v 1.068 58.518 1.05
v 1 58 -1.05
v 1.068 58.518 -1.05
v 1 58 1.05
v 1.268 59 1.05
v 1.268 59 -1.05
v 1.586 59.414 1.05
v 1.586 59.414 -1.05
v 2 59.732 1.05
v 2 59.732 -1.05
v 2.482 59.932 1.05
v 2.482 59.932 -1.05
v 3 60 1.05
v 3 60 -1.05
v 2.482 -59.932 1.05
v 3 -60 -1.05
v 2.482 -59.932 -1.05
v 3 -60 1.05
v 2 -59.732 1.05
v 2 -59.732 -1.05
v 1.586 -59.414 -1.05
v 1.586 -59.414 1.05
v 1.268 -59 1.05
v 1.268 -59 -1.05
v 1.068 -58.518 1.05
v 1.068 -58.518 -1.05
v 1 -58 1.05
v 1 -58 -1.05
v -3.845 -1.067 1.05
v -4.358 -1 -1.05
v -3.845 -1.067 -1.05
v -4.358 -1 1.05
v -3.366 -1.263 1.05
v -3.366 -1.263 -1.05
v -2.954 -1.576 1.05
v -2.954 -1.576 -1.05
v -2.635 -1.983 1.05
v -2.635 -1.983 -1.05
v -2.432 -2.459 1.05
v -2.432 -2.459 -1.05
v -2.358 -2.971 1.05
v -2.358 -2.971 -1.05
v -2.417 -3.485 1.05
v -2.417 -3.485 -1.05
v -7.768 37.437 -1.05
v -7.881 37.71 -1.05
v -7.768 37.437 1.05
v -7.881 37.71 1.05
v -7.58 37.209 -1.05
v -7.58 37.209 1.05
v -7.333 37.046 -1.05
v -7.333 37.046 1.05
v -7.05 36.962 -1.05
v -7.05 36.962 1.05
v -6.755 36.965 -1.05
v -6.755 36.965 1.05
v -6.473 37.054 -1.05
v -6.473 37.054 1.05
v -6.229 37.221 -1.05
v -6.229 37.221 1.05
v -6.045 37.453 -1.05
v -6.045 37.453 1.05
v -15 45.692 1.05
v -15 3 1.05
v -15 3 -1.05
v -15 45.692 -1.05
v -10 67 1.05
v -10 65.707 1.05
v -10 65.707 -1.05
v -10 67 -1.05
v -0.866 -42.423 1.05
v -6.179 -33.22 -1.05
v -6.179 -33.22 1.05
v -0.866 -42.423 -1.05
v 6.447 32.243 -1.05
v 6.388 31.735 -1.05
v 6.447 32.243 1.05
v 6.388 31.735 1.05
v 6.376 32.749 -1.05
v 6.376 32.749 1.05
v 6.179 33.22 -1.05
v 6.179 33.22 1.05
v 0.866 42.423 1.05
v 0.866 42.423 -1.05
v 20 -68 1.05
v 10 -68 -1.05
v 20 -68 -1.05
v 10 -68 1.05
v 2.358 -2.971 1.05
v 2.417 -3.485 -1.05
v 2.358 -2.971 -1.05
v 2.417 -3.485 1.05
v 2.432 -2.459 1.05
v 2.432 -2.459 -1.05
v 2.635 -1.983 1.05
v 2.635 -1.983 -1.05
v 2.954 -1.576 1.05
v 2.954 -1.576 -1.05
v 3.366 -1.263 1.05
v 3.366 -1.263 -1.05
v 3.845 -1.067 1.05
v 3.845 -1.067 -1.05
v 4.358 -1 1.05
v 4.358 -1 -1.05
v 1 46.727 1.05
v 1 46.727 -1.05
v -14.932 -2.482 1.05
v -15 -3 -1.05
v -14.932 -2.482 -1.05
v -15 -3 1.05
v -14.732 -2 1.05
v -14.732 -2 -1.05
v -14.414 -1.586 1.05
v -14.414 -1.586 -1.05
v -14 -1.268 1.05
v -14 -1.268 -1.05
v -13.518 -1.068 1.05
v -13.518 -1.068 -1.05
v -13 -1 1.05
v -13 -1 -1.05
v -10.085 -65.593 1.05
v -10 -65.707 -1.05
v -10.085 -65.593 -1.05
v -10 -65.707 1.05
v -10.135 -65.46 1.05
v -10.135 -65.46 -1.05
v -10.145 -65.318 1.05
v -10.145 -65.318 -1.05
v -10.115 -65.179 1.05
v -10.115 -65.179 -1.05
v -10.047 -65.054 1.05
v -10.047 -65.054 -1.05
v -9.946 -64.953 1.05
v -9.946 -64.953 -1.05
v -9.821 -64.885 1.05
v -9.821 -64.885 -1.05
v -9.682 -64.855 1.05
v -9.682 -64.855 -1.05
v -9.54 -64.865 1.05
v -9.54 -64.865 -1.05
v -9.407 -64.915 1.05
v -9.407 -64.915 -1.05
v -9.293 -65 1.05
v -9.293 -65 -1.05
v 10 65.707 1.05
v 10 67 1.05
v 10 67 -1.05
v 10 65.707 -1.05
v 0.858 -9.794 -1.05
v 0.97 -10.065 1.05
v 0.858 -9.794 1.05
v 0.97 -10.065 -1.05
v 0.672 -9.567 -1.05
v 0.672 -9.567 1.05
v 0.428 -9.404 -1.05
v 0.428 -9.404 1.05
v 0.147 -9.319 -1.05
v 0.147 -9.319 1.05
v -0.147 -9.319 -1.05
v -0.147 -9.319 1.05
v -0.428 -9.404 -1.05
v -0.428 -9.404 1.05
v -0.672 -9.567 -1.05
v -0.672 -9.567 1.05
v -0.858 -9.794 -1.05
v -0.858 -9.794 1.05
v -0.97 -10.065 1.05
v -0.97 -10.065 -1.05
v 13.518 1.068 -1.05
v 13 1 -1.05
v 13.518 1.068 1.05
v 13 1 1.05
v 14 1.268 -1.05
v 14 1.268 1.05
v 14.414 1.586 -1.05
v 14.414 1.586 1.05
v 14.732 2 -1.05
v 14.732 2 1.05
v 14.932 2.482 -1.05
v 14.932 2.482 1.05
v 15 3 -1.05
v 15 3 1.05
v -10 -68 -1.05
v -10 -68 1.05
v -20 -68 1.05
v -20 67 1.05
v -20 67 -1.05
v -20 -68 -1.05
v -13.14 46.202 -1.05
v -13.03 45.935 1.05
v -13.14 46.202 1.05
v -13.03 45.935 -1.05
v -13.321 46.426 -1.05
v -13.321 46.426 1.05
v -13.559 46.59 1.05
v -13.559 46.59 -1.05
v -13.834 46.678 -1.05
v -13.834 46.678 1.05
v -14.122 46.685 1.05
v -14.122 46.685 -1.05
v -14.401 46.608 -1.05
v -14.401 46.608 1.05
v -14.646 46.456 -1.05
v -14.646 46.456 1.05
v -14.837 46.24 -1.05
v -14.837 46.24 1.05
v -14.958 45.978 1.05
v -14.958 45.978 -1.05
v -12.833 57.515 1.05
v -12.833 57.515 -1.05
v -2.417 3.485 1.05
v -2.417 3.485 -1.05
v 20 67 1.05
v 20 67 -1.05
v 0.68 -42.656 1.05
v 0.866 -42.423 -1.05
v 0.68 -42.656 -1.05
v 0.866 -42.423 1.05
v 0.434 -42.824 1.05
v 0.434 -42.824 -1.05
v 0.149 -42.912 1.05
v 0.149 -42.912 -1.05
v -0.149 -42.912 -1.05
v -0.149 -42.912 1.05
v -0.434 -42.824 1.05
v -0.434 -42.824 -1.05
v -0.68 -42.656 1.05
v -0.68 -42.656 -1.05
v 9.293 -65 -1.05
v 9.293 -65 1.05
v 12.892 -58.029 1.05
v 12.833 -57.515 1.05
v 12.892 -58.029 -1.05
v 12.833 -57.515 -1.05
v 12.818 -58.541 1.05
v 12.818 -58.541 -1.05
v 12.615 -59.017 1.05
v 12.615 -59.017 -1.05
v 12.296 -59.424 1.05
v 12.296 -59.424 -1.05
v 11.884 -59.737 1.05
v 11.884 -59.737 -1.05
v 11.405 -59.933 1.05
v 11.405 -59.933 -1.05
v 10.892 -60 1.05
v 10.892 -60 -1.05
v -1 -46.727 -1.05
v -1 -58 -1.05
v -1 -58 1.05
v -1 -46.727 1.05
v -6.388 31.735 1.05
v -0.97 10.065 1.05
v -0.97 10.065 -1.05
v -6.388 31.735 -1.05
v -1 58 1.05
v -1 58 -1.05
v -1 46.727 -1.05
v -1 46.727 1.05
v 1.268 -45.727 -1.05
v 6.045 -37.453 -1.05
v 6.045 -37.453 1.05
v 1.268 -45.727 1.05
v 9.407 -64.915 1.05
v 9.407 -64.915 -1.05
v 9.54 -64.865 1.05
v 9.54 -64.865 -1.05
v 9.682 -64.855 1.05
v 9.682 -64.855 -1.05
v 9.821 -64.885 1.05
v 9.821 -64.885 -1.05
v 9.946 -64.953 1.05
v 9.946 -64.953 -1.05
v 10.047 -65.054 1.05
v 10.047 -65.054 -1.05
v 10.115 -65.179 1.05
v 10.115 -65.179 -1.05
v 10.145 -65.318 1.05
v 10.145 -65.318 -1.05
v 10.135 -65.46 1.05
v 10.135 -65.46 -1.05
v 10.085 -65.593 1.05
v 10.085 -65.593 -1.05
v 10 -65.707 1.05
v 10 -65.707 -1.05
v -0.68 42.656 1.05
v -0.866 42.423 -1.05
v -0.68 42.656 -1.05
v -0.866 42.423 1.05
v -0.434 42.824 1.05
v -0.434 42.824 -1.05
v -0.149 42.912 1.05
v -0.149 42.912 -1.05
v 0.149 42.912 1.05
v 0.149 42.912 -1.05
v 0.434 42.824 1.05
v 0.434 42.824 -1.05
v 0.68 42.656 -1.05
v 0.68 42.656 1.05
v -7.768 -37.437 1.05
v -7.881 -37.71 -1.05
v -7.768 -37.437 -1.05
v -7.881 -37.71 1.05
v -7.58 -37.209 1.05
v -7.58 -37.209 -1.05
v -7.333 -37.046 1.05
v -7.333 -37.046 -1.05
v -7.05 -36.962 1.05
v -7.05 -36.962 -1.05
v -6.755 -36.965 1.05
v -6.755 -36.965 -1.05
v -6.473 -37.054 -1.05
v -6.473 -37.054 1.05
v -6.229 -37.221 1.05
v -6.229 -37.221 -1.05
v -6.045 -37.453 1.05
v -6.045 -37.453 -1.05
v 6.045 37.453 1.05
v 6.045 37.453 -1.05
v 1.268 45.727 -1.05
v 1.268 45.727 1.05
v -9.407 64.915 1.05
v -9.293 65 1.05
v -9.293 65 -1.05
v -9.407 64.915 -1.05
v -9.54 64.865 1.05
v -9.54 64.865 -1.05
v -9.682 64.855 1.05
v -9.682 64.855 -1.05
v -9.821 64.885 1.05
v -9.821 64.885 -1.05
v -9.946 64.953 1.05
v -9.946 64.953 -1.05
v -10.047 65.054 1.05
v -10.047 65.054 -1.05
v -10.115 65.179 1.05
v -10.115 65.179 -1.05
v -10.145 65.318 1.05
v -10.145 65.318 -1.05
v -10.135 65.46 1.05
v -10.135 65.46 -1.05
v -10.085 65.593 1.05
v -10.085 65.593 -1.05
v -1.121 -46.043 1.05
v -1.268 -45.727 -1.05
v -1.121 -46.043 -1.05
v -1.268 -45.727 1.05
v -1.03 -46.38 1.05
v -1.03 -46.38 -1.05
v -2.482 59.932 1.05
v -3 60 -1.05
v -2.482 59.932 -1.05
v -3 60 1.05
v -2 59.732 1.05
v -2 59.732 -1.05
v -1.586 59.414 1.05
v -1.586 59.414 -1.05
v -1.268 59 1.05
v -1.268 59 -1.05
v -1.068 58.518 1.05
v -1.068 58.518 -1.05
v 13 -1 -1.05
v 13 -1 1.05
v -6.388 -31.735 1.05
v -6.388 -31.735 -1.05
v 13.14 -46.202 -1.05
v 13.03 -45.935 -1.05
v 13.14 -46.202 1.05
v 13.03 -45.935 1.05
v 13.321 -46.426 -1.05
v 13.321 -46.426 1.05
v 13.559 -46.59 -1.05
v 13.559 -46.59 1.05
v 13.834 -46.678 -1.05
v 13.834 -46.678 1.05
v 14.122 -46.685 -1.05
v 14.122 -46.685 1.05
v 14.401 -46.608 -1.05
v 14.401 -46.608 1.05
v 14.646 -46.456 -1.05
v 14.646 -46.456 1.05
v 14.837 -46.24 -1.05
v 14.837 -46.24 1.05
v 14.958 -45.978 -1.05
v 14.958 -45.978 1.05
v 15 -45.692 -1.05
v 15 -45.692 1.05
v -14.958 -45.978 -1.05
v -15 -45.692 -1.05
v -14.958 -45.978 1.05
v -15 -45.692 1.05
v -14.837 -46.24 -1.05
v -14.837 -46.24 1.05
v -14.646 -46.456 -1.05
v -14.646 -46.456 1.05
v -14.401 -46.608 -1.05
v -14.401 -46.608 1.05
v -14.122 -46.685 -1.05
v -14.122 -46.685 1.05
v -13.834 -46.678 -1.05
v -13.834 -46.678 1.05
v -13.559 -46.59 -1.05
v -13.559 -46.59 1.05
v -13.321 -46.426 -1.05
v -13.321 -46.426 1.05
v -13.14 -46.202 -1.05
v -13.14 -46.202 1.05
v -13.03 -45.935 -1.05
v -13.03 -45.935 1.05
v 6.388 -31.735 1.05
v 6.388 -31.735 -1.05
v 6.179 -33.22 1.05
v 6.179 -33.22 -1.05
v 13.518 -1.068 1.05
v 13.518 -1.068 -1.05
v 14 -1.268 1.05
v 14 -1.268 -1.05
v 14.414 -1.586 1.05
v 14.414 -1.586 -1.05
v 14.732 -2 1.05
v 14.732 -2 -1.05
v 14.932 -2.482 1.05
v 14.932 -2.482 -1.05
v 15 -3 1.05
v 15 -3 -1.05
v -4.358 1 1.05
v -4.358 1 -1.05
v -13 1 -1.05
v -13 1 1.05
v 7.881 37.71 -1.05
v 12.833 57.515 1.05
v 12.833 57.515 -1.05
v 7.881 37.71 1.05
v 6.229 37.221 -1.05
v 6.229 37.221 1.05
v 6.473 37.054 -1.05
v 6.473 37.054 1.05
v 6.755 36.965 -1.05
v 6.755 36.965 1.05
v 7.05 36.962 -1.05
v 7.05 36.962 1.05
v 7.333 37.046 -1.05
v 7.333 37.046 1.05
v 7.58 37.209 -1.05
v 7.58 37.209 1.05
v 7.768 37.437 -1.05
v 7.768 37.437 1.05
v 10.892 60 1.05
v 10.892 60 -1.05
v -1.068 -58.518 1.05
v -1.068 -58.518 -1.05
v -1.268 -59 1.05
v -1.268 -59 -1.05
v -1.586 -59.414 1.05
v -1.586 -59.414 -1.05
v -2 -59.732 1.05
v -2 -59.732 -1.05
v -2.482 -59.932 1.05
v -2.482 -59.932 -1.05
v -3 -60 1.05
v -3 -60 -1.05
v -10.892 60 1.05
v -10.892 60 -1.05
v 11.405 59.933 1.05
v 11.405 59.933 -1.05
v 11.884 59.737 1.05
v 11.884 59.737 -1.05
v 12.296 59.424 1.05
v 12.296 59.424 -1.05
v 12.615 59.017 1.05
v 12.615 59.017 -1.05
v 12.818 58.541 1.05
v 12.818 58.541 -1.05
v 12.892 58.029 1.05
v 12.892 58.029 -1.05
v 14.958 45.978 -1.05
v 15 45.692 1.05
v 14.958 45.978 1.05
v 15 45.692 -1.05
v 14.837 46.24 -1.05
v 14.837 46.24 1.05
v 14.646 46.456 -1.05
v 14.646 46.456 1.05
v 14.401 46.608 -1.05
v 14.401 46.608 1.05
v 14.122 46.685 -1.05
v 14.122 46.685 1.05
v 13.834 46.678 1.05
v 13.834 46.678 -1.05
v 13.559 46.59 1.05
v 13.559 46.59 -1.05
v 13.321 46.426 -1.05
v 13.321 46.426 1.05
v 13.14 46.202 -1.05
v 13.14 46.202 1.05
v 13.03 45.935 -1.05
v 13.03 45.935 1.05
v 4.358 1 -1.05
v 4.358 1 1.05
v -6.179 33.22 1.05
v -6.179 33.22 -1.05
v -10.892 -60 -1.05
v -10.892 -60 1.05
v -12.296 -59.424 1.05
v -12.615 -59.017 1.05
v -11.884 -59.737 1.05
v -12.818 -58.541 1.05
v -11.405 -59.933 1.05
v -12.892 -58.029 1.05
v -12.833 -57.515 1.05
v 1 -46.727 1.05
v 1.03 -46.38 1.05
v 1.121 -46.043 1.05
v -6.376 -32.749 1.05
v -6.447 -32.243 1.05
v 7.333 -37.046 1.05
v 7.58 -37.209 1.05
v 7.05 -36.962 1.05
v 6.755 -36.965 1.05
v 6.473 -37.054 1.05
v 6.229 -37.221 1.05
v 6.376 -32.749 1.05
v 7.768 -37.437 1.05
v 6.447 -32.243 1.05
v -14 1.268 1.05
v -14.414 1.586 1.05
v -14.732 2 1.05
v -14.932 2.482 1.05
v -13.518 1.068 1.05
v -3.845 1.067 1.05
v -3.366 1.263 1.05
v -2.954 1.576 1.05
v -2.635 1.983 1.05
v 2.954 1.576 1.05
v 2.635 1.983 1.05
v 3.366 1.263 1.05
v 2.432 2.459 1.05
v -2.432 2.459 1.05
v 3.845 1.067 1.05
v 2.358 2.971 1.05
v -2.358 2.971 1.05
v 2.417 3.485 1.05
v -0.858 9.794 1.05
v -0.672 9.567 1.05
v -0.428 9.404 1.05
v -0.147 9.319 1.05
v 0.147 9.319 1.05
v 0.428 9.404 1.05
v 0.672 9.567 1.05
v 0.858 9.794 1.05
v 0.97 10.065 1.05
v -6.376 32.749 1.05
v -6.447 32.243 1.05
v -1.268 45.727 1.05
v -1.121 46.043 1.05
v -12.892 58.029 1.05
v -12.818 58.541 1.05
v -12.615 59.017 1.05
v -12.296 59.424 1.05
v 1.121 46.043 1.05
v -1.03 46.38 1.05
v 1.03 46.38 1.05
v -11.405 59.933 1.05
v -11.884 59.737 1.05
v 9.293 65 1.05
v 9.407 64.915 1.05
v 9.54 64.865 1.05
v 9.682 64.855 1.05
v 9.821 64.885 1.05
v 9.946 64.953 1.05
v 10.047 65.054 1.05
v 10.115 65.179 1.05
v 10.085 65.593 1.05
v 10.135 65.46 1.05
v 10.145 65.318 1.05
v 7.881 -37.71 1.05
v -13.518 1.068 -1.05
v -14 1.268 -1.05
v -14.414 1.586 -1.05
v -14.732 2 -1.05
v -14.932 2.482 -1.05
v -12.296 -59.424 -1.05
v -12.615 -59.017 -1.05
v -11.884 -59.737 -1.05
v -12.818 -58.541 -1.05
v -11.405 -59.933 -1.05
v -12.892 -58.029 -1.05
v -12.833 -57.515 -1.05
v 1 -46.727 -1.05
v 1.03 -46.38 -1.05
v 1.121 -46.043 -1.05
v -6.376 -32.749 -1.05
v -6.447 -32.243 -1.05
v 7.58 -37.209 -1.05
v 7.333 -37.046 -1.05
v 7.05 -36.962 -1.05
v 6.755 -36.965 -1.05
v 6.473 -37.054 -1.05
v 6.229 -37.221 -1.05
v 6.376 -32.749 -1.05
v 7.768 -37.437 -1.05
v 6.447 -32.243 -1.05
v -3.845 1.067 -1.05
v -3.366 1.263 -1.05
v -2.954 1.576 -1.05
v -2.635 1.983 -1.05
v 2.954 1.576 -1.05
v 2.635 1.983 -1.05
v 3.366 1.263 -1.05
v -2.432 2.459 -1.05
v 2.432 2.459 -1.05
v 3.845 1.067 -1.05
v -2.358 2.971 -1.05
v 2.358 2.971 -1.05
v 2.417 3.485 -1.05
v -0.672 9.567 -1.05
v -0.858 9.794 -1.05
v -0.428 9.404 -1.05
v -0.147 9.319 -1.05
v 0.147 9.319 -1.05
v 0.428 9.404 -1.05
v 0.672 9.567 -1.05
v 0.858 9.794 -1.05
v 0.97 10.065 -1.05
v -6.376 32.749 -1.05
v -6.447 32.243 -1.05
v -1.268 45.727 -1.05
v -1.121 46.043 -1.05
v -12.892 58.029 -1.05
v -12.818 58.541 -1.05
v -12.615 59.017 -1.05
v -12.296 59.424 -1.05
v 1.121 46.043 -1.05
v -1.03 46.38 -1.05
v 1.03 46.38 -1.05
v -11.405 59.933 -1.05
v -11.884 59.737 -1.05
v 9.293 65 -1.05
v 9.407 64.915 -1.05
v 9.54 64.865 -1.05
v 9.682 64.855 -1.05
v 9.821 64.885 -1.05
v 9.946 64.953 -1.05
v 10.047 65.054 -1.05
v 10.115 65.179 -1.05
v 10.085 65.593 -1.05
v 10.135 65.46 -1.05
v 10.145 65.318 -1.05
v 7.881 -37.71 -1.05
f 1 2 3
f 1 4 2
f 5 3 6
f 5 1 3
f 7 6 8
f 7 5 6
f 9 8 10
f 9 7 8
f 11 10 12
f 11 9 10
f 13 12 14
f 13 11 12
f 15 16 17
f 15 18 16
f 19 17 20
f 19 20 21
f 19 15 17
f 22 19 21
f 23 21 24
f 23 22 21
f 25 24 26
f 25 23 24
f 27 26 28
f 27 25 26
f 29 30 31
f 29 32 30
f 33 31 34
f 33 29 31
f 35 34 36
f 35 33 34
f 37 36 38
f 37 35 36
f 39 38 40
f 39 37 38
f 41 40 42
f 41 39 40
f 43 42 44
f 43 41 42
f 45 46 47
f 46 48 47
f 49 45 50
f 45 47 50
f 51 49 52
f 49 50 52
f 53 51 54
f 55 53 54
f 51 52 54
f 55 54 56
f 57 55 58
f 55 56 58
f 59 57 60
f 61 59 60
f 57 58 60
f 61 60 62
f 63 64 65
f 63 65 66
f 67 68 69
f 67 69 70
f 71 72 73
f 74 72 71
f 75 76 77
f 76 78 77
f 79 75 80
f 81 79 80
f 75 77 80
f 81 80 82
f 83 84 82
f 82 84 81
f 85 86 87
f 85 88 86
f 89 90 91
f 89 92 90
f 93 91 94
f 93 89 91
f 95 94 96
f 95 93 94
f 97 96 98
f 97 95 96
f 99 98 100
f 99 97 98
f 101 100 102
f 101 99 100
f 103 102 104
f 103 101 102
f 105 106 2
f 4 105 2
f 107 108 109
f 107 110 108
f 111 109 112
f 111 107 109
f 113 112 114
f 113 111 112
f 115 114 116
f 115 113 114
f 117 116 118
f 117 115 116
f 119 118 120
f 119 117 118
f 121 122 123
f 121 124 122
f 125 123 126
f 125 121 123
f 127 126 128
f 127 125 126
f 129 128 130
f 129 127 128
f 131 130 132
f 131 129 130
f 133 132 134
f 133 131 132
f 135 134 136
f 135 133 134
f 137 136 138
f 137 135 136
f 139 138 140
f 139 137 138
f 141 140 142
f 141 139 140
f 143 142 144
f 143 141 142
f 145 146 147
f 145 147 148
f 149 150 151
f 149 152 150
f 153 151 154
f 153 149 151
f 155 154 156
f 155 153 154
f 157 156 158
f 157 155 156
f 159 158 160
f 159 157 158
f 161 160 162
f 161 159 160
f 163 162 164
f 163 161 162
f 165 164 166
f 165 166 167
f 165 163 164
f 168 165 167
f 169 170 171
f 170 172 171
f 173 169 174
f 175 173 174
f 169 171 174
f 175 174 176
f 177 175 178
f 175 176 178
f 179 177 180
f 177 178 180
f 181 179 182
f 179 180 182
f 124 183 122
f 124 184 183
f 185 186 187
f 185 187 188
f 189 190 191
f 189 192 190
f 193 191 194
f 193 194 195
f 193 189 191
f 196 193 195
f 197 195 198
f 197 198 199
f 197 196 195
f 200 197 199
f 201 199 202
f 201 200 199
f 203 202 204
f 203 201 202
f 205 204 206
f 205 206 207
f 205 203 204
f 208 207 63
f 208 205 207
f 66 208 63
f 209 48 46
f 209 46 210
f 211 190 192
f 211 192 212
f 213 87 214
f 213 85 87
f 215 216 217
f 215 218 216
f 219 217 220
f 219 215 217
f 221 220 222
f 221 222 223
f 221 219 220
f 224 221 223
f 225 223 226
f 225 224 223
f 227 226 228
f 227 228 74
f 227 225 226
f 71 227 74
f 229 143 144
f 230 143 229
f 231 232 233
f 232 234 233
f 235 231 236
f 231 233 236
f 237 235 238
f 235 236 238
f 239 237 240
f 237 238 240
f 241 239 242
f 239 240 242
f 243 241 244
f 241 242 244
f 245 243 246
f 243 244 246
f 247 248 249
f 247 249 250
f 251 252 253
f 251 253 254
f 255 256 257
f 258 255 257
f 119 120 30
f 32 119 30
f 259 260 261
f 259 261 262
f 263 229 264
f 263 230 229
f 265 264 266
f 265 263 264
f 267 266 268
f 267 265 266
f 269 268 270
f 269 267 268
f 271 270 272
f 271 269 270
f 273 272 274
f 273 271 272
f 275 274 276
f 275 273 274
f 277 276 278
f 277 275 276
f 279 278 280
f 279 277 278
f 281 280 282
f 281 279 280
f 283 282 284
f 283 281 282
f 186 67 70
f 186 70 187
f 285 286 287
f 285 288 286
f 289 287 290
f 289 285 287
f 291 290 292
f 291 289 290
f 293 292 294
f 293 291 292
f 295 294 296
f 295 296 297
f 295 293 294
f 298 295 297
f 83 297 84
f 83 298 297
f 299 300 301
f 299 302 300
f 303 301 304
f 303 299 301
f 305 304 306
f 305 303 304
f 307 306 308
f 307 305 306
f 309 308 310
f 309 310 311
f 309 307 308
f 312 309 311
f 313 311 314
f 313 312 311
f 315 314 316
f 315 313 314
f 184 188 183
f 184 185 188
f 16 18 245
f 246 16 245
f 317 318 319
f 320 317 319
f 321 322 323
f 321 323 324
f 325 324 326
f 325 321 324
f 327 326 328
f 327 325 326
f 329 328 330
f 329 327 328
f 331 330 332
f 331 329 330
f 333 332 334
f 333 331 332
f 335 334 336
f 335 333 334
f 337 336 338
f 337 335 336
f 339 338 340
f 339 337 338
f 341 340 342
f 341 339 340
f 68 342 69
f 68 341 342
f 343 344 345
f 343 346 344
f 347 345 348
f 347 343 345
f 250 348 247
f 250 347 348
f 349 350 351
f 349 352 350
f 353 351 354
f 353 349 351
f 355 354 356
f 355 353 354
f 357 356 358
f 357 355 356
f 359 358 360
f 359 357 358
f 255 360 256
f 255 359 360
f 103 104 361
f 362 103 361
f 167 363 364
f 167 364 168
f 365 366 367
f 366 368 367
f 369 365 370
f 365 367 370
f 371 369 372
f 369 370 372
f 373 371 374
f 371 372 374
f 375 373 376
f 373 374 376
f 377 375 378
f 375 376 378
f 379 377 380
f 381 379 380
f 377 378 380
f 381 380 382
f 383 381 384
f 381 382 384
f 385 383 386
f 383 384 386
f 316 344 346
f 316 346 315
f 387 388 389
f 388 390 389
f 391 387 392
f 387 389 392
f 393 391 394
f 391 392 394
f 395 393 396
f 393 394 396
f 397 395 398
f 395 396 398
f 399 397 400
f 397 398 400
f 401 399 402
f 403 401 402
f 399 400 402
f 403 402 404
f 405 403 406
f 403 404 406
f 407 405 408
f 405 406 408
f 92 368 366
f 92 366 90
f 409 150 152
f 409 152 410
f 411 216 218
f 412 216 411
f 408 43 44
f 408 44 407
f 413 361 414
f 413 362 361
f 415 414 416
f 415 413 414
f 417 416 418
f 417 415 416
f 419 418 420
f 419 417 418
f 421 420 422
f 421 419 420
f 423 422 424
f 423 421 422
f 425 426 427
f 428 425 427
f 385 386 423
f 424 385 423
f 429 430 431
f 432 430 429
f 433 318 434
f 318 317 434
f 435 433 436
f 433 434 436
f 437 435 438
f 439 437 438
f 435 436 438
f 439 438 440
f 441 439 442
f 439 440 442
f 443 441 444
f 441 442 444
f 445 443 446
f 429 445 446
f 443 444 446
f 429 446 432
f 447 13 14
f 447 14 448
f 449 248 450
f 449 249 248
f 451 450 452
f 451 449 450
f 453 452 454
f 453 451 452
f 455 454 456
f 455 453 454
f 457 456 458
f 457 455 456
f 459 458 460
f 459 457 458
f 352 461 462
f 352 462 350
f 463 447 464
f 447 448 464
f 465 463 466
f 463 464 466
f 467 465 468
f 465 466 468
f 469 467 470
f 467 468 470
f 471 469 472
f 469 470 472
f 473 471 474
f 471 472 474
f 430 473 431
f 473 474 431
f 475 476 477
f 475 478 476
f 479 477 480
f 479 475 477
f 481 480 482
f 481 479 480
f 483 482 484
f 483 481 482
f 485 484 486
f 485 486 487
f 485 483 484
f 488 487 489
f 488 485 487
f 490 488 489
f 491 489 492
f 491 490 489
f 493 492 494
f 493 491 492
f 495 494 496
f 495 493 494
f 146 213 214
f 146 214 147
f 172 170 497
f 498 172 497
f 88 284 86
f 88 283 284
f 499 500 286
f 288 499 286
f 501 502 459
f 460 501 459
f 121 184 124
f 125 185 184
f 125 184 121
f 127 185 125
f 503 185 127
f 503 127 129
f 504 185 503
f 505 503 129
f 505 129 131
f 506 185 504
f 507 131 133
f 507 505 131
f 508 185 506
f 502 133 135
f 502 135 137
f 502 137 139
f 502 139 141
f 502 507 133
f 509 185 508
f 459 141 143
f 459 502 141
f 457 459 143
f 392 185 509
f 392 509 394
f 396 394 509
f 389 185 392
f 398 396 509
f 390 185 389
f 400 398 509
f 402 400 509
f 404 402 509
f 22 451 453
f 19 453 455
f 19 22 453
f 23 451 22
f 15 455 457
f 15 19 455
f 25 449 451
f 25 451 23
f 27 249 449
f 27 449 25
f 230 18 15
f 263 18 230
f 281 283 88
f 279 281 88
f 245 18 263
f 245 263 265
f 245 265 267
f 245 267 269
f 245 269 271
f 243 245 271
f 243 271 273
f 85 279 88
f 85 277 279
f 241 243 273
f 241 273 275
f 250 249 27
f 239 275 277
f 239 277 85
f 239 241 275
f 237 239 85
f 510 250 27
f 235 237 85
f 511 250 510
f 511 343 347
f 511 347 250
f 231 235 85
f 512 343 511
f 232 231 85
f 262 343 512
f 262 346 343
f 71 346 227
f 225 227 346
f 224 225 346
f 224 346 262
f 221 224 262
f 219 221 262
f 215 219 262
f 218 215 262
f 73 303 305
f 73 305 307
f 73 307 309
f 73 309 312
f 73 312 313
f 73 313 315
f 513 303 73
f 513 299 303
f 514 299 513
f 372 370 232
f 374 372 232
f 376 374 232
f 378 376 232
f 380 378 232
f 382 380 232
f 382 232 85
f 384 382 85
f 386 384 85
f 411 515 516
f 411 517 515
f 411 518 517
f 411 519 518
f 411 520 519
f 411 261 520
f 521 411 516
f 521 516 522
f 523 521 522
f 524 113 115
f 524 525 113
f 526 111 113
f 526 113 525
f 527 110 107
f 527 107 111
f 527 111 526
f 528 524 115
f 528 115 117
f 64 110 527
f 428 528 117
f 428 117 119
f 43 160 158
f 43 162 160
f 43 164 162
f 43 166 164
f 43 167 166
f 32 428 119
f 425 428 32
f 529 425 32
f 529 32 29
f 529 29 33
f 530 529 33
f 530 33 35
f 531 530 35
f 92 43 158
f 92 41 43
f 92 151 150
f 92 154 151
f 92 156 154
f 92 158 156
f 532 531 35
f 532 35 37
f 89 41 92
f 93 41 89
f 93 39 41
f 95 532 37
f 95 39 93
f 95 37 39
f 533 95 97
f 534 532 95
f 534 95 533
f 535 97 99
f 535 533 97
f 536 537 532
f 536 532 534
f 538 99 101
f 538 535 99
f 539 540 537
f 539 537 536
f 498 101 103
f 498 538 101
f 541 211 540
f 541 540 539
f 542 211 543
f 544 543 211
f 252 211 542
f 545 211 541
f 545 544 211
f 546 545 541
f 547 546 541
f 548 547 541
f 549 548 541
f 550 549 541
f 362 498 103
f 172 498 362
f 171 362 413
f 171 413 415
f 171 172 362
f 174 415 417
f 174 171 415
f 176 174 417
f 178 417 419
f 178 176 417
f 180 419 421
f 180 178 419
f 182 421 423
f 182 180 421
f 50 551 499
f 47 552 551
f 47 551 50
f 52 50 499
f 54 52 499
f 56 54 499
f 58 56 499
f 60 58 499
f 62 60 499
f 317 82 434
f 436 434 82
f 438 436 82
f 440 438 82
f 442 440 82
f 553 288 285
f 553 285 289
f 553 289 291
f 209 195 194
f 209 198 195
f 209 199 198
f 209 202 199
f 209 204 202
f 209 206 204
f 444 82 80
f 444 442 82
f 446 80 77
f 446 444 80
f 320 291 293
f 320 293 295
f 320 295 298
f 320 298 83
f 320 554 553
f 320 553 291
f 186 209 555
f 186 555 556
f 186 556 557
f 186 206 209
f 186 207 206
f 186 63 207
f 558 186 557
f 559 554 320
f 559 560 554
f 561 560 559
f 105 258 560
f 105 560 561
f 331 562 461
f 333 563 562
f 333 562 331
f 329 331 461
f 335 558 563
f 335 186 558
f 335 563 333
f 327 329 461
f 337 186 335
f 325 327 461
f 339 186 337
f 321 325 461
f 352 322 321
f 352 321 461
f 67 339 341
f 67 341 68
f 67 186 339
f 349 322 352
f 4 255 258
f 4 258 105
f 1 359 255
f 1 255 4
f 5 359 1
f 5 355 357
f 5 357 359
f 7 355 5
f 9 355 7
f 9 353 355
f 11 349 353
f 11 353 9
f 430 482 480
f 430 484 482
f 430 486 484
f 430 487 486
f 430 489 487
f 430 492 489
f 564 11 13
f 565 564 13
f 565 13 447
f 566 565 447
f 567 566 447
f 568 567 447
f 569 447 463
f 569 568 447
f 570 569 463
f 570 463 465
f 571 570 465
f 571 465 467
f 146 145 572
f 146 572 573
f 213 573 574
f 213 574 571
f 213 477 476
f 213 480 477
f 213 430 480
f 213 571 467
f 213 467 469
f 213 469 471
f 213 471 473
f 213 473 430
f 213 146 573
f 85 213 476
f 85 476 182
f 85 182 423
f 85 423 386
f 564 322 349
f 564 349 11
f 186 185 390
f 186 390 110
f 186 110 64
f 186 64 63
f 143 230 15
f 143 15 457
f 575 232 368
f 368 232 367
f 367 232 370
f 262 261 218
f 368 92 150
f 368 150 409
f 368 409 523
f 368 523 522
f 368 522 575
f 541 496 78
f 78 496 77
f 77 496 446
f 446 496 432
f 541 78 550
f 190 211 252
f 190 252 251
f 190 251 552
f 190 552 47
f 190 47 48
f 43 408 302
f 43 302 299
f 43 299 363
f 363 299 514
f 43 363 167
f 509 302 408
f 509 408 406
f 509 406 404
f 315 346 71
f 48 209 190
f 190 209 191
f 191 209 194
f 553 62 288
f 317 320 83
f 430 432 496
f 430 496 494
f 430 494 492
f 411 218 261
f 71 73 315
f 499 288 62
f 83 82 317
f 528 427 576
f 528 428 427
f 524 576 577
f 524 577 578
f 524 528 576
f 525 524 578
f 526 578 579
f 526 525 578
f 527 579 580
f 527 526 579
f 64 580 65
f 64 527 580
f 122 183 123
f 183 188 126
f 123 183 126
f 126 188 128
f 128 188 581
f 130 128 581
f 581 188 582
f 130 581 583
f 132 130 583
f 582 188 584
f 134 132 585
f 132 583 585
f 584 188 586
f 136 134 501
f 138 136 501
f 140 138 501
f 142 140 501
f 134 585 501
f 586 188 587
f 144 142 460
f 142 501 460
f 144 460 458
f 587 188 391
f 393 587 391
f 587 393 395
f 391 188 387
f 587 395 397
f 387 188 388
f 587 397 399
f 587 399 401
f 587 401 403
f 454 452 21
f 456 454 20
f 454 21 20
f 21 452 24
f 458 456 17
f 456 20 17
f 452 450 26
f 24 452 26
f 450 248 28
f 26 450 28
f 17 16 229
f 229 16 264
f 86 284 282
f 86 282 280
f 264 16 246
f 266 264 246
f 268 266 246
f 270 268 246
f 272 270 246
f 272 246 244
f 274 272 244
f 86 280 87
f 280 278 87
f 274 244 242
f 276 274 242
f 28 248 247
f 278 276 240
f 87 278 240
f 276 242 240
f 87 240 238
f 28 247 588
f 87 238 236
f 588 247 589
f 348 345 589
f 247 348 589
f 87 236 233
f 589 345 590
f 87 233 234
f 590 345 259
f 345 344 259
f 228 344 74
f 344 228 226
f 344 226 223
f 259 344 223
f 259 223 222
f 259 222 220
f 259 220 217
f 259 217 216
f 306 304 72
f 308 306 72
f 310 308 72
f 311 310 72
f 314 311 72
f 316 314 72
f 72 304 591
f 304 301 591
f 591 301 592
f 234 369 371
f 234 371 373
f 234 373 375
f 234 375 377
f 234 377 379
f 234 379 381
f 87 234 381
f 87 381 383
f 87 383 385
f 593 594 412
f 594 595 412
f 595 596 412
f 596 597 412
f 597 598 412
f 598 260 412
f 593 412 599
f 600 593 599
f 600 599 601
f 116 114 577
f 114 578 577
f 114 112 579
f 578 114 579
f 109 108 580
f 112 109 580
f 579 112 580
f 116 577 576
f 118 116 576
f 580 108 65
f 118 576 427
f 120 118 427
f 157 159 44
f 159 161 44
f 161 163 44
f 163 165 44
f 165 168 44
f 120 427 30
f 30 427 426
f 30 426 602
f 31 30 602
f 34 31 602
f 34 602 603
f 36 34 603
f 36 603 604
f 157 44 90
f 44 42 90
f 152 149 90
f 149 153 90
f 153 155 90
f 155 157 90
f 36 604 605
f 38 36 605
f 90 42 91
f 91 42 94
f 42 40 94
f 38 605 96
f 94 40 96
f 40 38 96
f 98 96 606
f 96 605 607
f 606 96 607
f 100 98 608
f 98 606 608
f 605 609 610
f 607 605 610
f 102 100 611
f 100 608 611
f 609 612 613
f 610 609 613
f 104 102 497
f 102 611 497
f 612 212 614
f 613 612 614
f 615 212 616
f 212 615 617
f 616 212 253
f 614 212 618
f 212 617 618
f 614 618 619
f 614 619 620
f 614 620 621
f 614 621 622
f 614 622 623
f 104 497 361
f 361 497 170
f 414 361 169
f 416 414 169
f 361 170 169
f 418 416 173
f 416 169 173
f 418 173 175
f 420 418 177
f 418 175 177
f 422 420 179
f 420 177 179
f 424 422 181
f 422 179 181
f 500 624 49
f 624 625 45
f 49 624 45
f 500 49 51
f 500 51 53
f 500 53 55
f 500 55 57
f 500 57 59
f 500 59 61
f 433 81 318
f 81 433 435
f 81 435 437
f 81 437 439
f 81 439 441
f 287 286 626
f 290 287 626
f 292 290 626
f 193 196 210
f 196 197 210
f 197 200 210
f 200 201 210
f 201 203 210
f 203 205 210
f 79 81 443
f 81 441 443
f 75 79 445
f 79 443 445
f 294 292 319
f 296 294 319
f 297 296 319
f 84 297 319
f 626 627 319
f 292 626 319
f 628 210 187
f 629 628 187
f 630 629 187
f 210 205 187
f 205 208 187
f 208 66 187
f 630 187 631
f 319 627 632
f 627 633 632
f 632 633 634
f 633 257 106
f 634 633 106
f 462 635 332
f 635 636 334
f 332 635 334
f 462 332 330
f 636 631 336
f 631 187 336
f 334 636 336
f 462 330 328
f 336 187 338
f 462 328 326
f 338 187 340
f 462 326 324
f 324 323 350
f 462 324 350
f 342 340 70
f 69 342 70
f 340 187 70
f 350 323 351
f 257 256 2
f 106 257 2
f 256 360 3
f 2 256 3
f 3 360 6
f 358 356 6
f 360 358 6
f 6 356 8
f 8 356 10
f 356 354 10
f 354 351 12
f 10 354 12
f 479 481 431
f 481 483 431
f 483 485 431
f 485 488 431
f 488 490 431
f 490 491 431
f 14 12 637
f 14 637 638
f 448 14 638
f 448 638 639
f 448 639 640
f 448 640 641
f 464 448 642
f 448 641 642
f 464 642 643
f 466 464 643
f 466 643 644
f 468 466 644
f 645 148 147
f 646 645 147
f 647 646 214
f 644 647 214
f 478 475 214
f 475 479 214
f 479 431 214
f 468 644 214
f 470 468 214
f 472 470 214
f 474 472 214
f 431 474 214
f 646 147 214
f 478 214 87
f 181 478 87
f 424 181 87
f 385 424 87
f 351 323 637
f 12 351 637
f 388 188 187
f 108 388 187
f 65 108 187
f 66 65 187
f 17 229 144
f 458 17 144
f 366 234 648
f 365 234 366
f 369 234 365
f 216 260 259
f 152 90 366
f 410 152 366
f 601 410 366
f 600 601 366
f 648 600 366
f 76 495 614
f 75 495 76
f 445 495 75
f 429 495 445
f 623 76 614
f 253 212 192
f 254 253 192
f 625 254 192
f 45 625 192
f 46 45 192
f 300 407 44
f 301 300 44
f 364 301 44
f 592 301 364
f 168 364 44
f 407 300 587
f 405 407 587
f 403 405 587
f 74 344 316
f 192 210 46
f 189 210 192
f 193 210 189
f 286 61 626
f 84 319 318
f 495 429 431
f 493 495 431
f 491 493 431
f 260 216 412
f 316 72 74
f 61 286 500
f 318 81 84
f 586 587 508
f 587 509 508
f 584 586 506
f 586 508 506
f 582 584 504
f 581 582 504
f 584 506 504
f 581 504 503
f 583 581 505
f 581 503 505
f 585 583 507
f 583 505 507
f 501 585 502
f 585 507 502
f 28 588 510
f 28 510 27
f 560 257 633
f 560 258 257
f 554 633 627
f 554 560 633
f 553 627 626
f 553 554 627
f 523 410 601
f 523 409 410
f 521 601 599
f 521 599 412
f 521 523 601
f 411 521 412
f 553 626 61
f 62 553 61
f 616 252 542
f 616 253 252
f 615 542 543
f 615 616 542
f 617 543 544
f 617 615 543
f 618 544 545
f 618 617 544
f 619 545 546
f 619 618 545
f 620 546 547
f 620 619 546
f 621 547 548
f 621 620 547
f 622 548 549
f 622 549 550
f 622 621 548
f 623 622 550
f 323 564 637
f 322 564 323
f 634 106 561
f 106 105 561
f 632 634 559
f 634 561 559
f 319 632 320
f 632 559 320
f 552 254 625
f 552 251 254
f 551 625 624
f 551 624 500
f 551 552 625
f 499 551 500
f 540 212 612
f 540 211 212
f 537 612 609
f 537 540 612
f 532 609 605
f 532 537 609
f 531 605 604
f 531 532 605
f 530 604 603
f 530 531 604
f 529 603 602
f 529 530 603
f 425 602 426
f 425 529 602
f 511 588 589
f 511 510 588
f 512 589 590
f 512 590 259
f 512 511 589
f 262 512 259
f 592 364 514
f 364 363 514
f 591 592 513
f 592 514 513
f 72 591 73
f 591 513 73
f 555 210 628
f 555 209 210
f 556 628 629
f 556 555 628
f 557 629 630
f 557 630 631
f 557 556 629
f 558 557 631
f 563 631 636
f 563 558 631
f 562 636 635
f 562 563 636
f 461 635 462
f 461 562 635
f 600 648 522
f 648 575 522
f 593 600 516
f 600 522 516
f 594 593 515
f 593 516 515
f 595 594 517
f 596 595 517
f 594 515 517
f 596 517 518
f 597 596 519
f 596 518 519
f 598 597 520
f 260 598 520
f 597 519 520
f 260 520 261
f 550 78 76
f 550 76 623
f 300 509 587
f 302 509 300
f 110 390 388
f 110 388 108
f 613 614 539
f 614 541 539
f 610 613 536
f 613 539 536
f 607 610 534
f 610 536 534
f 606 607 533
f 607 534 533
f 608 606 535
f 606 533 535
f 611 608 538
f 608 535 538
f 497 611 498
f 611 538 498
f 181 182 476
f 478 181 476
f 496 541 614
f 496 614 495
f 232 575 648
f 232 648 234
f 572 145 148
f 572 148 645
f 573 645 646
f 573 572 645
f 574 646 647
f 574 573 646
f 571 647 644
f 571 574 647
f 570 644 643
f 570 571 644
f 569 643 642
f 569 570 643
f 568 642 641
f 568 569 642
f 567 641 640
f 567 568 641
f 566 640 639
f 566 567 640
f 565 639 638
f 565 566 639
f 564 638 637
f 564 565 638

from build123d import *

# Parameters (mm, degrees)
SKETCH_1_W        = 30
SKETCH_1_H        = 120
EXTRUDE_1_DEPTH   = 1.05
EXTRUDE_1_2_DEPTH = 2.1
EXTRUDE_START     = -2.1
EXTRUDE_3_DEPTH   = 2.1
FILLET_1_R        = 1
FILLET_2_R        = 2
FILLET_3_R        = 1


# Read off the part's stored shape, not the designer's step: 拉伸-薄壁3
with BuildPart() as part:
    # 草图1 → Extrude 1 (new, symmetric)
    with BuildSketch(Plane.XY):
        with BuildLine():
            Line((20, -68), (20, 67))
            Line((20, 67), (10, 67))
            Line((10, 67), (10, 65.707106781))
            ThreePointArc((10, 65.707106781), (10, 65), (9.292893219, 65))
            Line((9.292893219, 65), (-9.292893219, 65))
            ThreePointArc((-9.292893219, 65), (-10, 65), (-10, 65.707106781))
            Line((-10, 65.707106781), (-10, 67))
            Line((-10, 67), (-20, 67))
            Line((-20, 67), (-20, -68))
            Line((-20, -68), (-10, -68))
            Line((-10, -68), (-10, -65.707106781))
            ThreePointArc((-10, -65.707106781), (-10, -65), (-9.292893219, -65))
            Line((-9.292893219, -65), (9.292893219, -65))
            ThreePointArc((9.292893219, -65), (10, -65), (10, -65.707106781))
            Line((10, -65.707106781), (10, -68))
            Line((10, -68), (20, -68))
        make_face()
        Rectangle(SKETCH_1_W, SKETCH_1_H, mode=Mode.SUBTRACT)
    extrude(amount=EXTRUDE_1_DEPTH, both=True)

    # 草图2 → Extrude 1 2 (add)
    with BuildSketch(Plane.XY.offset(1.05)):
        Polygon((13.54478625, 60.363803438), (-16.45521375, -59.636196562), (-13.54478625, -60.363803438), (16.45521375, 59.636196562), align=None)
        Polygon((16.45521375, -59.636196562), (-13.54478625, 60.363803438), (-16.45521375, 59.636196562), (13.54478625, -60.363803438), align=None)
    extrude(amount=-EXTRUDE_1_2_DEPTH)

    # 拉伸-薄壁3 outline → 拉伸-薄壁3 (add)
    with BuildSketch(Plane.XY.offset(1.05).offset(EXTRUDE_START)):
        Polygon((15, 1), (1.79616461, 1), (1.54616461, 0), (1.79616461, -1), (15, -1), align=None)
        Polygon((-1.79616461, 1), (-15, 1), (-15, -1), (-1.79616461, -1), (-1.54616461, 0), align=None)
        Polygon((1, 46.191241385), (1, 60), (-1, 60), (-1, 46.191241385), (-7.281623132, 35.311150966), (-6.583792611, 32.519828883), (0, 43.923292192), (6.583792611, 32.519828883), (7.281623132, 35.311150966), align=None)
    extrude_3 = extrude(amount=EXTRUDE_3_DEPTH)

    # 镜向1: 拉伸-薄壁3 across plane
    add(extrude_3.mirror(Plane.ZX))

    # 圆角1
    fillet_1_edges = [part.edges().sort_by_distance(p)[0] for p in [
        (15, 53.815341562, 0),
        (0, 6.184658438, 0),
        (15, -53.815341562, 0),
        (0, -6.184658438, 0),
        (-15, -53.815341562, 0),
        (-15, 53.815341562, 0),
    ]]
    fillet(fillet_1_edges, radius=FILLET_1_R)

    # 圆角2
    fillet_2_edges = [part.edges().sort_by_distance(p)[0] for p in [
        (13.45383539, -60, 0),
        (-13.45383539, -60, 0),
        (-13.45383539, 60, 0),
        (13.45383539, 60, 0),
        (1.79616461, 1, 0),
        (1.79616461, -1, 0),
        (-1.79616461, -1, 0),
        (-1.79616461, 1, 0),
        (-15, 1, 0),
        (15, 1, 0),
        (-15, -1, 0),
        (15, -1, 0),
        (6.583792611, 32.519828883, 0),
        (-6.583792611, 32.519828883, 0),
        (1, 60, 0),
        (-1, 60, 0),
        (-1, 46.191241385, 0),
        (1, 46.191241385, 0),
        (-6.583792611, -32.519828883, 0),
        (6.583792611, -32.519828883, 0),
        (1, -46.191241385, 0),
        (-1, -46.191241385, 0),
        (-1, -60, 0),
        (1, -60, 0),
    ]]
    fillet(fillet_2_edges, radius=FILLET_2_R)

    # 圆角3
    fillet_3_edges = [part.edges().sort_by_distance(p)[0] for p in [
        (7.281623132, 35.311150966, 0),
        (-7.281623132, 35.311150966, 0),
        (0, 43.923292192, 0),
        (-7.281623132, -35.311150966, 0),
        (7.281623132, -35.311150966, 0),
        (0, -43.923292192, 0),
    ]]
    fillet(fillet_3_edges, radius=FILLET_3_R)


solid = part.part
